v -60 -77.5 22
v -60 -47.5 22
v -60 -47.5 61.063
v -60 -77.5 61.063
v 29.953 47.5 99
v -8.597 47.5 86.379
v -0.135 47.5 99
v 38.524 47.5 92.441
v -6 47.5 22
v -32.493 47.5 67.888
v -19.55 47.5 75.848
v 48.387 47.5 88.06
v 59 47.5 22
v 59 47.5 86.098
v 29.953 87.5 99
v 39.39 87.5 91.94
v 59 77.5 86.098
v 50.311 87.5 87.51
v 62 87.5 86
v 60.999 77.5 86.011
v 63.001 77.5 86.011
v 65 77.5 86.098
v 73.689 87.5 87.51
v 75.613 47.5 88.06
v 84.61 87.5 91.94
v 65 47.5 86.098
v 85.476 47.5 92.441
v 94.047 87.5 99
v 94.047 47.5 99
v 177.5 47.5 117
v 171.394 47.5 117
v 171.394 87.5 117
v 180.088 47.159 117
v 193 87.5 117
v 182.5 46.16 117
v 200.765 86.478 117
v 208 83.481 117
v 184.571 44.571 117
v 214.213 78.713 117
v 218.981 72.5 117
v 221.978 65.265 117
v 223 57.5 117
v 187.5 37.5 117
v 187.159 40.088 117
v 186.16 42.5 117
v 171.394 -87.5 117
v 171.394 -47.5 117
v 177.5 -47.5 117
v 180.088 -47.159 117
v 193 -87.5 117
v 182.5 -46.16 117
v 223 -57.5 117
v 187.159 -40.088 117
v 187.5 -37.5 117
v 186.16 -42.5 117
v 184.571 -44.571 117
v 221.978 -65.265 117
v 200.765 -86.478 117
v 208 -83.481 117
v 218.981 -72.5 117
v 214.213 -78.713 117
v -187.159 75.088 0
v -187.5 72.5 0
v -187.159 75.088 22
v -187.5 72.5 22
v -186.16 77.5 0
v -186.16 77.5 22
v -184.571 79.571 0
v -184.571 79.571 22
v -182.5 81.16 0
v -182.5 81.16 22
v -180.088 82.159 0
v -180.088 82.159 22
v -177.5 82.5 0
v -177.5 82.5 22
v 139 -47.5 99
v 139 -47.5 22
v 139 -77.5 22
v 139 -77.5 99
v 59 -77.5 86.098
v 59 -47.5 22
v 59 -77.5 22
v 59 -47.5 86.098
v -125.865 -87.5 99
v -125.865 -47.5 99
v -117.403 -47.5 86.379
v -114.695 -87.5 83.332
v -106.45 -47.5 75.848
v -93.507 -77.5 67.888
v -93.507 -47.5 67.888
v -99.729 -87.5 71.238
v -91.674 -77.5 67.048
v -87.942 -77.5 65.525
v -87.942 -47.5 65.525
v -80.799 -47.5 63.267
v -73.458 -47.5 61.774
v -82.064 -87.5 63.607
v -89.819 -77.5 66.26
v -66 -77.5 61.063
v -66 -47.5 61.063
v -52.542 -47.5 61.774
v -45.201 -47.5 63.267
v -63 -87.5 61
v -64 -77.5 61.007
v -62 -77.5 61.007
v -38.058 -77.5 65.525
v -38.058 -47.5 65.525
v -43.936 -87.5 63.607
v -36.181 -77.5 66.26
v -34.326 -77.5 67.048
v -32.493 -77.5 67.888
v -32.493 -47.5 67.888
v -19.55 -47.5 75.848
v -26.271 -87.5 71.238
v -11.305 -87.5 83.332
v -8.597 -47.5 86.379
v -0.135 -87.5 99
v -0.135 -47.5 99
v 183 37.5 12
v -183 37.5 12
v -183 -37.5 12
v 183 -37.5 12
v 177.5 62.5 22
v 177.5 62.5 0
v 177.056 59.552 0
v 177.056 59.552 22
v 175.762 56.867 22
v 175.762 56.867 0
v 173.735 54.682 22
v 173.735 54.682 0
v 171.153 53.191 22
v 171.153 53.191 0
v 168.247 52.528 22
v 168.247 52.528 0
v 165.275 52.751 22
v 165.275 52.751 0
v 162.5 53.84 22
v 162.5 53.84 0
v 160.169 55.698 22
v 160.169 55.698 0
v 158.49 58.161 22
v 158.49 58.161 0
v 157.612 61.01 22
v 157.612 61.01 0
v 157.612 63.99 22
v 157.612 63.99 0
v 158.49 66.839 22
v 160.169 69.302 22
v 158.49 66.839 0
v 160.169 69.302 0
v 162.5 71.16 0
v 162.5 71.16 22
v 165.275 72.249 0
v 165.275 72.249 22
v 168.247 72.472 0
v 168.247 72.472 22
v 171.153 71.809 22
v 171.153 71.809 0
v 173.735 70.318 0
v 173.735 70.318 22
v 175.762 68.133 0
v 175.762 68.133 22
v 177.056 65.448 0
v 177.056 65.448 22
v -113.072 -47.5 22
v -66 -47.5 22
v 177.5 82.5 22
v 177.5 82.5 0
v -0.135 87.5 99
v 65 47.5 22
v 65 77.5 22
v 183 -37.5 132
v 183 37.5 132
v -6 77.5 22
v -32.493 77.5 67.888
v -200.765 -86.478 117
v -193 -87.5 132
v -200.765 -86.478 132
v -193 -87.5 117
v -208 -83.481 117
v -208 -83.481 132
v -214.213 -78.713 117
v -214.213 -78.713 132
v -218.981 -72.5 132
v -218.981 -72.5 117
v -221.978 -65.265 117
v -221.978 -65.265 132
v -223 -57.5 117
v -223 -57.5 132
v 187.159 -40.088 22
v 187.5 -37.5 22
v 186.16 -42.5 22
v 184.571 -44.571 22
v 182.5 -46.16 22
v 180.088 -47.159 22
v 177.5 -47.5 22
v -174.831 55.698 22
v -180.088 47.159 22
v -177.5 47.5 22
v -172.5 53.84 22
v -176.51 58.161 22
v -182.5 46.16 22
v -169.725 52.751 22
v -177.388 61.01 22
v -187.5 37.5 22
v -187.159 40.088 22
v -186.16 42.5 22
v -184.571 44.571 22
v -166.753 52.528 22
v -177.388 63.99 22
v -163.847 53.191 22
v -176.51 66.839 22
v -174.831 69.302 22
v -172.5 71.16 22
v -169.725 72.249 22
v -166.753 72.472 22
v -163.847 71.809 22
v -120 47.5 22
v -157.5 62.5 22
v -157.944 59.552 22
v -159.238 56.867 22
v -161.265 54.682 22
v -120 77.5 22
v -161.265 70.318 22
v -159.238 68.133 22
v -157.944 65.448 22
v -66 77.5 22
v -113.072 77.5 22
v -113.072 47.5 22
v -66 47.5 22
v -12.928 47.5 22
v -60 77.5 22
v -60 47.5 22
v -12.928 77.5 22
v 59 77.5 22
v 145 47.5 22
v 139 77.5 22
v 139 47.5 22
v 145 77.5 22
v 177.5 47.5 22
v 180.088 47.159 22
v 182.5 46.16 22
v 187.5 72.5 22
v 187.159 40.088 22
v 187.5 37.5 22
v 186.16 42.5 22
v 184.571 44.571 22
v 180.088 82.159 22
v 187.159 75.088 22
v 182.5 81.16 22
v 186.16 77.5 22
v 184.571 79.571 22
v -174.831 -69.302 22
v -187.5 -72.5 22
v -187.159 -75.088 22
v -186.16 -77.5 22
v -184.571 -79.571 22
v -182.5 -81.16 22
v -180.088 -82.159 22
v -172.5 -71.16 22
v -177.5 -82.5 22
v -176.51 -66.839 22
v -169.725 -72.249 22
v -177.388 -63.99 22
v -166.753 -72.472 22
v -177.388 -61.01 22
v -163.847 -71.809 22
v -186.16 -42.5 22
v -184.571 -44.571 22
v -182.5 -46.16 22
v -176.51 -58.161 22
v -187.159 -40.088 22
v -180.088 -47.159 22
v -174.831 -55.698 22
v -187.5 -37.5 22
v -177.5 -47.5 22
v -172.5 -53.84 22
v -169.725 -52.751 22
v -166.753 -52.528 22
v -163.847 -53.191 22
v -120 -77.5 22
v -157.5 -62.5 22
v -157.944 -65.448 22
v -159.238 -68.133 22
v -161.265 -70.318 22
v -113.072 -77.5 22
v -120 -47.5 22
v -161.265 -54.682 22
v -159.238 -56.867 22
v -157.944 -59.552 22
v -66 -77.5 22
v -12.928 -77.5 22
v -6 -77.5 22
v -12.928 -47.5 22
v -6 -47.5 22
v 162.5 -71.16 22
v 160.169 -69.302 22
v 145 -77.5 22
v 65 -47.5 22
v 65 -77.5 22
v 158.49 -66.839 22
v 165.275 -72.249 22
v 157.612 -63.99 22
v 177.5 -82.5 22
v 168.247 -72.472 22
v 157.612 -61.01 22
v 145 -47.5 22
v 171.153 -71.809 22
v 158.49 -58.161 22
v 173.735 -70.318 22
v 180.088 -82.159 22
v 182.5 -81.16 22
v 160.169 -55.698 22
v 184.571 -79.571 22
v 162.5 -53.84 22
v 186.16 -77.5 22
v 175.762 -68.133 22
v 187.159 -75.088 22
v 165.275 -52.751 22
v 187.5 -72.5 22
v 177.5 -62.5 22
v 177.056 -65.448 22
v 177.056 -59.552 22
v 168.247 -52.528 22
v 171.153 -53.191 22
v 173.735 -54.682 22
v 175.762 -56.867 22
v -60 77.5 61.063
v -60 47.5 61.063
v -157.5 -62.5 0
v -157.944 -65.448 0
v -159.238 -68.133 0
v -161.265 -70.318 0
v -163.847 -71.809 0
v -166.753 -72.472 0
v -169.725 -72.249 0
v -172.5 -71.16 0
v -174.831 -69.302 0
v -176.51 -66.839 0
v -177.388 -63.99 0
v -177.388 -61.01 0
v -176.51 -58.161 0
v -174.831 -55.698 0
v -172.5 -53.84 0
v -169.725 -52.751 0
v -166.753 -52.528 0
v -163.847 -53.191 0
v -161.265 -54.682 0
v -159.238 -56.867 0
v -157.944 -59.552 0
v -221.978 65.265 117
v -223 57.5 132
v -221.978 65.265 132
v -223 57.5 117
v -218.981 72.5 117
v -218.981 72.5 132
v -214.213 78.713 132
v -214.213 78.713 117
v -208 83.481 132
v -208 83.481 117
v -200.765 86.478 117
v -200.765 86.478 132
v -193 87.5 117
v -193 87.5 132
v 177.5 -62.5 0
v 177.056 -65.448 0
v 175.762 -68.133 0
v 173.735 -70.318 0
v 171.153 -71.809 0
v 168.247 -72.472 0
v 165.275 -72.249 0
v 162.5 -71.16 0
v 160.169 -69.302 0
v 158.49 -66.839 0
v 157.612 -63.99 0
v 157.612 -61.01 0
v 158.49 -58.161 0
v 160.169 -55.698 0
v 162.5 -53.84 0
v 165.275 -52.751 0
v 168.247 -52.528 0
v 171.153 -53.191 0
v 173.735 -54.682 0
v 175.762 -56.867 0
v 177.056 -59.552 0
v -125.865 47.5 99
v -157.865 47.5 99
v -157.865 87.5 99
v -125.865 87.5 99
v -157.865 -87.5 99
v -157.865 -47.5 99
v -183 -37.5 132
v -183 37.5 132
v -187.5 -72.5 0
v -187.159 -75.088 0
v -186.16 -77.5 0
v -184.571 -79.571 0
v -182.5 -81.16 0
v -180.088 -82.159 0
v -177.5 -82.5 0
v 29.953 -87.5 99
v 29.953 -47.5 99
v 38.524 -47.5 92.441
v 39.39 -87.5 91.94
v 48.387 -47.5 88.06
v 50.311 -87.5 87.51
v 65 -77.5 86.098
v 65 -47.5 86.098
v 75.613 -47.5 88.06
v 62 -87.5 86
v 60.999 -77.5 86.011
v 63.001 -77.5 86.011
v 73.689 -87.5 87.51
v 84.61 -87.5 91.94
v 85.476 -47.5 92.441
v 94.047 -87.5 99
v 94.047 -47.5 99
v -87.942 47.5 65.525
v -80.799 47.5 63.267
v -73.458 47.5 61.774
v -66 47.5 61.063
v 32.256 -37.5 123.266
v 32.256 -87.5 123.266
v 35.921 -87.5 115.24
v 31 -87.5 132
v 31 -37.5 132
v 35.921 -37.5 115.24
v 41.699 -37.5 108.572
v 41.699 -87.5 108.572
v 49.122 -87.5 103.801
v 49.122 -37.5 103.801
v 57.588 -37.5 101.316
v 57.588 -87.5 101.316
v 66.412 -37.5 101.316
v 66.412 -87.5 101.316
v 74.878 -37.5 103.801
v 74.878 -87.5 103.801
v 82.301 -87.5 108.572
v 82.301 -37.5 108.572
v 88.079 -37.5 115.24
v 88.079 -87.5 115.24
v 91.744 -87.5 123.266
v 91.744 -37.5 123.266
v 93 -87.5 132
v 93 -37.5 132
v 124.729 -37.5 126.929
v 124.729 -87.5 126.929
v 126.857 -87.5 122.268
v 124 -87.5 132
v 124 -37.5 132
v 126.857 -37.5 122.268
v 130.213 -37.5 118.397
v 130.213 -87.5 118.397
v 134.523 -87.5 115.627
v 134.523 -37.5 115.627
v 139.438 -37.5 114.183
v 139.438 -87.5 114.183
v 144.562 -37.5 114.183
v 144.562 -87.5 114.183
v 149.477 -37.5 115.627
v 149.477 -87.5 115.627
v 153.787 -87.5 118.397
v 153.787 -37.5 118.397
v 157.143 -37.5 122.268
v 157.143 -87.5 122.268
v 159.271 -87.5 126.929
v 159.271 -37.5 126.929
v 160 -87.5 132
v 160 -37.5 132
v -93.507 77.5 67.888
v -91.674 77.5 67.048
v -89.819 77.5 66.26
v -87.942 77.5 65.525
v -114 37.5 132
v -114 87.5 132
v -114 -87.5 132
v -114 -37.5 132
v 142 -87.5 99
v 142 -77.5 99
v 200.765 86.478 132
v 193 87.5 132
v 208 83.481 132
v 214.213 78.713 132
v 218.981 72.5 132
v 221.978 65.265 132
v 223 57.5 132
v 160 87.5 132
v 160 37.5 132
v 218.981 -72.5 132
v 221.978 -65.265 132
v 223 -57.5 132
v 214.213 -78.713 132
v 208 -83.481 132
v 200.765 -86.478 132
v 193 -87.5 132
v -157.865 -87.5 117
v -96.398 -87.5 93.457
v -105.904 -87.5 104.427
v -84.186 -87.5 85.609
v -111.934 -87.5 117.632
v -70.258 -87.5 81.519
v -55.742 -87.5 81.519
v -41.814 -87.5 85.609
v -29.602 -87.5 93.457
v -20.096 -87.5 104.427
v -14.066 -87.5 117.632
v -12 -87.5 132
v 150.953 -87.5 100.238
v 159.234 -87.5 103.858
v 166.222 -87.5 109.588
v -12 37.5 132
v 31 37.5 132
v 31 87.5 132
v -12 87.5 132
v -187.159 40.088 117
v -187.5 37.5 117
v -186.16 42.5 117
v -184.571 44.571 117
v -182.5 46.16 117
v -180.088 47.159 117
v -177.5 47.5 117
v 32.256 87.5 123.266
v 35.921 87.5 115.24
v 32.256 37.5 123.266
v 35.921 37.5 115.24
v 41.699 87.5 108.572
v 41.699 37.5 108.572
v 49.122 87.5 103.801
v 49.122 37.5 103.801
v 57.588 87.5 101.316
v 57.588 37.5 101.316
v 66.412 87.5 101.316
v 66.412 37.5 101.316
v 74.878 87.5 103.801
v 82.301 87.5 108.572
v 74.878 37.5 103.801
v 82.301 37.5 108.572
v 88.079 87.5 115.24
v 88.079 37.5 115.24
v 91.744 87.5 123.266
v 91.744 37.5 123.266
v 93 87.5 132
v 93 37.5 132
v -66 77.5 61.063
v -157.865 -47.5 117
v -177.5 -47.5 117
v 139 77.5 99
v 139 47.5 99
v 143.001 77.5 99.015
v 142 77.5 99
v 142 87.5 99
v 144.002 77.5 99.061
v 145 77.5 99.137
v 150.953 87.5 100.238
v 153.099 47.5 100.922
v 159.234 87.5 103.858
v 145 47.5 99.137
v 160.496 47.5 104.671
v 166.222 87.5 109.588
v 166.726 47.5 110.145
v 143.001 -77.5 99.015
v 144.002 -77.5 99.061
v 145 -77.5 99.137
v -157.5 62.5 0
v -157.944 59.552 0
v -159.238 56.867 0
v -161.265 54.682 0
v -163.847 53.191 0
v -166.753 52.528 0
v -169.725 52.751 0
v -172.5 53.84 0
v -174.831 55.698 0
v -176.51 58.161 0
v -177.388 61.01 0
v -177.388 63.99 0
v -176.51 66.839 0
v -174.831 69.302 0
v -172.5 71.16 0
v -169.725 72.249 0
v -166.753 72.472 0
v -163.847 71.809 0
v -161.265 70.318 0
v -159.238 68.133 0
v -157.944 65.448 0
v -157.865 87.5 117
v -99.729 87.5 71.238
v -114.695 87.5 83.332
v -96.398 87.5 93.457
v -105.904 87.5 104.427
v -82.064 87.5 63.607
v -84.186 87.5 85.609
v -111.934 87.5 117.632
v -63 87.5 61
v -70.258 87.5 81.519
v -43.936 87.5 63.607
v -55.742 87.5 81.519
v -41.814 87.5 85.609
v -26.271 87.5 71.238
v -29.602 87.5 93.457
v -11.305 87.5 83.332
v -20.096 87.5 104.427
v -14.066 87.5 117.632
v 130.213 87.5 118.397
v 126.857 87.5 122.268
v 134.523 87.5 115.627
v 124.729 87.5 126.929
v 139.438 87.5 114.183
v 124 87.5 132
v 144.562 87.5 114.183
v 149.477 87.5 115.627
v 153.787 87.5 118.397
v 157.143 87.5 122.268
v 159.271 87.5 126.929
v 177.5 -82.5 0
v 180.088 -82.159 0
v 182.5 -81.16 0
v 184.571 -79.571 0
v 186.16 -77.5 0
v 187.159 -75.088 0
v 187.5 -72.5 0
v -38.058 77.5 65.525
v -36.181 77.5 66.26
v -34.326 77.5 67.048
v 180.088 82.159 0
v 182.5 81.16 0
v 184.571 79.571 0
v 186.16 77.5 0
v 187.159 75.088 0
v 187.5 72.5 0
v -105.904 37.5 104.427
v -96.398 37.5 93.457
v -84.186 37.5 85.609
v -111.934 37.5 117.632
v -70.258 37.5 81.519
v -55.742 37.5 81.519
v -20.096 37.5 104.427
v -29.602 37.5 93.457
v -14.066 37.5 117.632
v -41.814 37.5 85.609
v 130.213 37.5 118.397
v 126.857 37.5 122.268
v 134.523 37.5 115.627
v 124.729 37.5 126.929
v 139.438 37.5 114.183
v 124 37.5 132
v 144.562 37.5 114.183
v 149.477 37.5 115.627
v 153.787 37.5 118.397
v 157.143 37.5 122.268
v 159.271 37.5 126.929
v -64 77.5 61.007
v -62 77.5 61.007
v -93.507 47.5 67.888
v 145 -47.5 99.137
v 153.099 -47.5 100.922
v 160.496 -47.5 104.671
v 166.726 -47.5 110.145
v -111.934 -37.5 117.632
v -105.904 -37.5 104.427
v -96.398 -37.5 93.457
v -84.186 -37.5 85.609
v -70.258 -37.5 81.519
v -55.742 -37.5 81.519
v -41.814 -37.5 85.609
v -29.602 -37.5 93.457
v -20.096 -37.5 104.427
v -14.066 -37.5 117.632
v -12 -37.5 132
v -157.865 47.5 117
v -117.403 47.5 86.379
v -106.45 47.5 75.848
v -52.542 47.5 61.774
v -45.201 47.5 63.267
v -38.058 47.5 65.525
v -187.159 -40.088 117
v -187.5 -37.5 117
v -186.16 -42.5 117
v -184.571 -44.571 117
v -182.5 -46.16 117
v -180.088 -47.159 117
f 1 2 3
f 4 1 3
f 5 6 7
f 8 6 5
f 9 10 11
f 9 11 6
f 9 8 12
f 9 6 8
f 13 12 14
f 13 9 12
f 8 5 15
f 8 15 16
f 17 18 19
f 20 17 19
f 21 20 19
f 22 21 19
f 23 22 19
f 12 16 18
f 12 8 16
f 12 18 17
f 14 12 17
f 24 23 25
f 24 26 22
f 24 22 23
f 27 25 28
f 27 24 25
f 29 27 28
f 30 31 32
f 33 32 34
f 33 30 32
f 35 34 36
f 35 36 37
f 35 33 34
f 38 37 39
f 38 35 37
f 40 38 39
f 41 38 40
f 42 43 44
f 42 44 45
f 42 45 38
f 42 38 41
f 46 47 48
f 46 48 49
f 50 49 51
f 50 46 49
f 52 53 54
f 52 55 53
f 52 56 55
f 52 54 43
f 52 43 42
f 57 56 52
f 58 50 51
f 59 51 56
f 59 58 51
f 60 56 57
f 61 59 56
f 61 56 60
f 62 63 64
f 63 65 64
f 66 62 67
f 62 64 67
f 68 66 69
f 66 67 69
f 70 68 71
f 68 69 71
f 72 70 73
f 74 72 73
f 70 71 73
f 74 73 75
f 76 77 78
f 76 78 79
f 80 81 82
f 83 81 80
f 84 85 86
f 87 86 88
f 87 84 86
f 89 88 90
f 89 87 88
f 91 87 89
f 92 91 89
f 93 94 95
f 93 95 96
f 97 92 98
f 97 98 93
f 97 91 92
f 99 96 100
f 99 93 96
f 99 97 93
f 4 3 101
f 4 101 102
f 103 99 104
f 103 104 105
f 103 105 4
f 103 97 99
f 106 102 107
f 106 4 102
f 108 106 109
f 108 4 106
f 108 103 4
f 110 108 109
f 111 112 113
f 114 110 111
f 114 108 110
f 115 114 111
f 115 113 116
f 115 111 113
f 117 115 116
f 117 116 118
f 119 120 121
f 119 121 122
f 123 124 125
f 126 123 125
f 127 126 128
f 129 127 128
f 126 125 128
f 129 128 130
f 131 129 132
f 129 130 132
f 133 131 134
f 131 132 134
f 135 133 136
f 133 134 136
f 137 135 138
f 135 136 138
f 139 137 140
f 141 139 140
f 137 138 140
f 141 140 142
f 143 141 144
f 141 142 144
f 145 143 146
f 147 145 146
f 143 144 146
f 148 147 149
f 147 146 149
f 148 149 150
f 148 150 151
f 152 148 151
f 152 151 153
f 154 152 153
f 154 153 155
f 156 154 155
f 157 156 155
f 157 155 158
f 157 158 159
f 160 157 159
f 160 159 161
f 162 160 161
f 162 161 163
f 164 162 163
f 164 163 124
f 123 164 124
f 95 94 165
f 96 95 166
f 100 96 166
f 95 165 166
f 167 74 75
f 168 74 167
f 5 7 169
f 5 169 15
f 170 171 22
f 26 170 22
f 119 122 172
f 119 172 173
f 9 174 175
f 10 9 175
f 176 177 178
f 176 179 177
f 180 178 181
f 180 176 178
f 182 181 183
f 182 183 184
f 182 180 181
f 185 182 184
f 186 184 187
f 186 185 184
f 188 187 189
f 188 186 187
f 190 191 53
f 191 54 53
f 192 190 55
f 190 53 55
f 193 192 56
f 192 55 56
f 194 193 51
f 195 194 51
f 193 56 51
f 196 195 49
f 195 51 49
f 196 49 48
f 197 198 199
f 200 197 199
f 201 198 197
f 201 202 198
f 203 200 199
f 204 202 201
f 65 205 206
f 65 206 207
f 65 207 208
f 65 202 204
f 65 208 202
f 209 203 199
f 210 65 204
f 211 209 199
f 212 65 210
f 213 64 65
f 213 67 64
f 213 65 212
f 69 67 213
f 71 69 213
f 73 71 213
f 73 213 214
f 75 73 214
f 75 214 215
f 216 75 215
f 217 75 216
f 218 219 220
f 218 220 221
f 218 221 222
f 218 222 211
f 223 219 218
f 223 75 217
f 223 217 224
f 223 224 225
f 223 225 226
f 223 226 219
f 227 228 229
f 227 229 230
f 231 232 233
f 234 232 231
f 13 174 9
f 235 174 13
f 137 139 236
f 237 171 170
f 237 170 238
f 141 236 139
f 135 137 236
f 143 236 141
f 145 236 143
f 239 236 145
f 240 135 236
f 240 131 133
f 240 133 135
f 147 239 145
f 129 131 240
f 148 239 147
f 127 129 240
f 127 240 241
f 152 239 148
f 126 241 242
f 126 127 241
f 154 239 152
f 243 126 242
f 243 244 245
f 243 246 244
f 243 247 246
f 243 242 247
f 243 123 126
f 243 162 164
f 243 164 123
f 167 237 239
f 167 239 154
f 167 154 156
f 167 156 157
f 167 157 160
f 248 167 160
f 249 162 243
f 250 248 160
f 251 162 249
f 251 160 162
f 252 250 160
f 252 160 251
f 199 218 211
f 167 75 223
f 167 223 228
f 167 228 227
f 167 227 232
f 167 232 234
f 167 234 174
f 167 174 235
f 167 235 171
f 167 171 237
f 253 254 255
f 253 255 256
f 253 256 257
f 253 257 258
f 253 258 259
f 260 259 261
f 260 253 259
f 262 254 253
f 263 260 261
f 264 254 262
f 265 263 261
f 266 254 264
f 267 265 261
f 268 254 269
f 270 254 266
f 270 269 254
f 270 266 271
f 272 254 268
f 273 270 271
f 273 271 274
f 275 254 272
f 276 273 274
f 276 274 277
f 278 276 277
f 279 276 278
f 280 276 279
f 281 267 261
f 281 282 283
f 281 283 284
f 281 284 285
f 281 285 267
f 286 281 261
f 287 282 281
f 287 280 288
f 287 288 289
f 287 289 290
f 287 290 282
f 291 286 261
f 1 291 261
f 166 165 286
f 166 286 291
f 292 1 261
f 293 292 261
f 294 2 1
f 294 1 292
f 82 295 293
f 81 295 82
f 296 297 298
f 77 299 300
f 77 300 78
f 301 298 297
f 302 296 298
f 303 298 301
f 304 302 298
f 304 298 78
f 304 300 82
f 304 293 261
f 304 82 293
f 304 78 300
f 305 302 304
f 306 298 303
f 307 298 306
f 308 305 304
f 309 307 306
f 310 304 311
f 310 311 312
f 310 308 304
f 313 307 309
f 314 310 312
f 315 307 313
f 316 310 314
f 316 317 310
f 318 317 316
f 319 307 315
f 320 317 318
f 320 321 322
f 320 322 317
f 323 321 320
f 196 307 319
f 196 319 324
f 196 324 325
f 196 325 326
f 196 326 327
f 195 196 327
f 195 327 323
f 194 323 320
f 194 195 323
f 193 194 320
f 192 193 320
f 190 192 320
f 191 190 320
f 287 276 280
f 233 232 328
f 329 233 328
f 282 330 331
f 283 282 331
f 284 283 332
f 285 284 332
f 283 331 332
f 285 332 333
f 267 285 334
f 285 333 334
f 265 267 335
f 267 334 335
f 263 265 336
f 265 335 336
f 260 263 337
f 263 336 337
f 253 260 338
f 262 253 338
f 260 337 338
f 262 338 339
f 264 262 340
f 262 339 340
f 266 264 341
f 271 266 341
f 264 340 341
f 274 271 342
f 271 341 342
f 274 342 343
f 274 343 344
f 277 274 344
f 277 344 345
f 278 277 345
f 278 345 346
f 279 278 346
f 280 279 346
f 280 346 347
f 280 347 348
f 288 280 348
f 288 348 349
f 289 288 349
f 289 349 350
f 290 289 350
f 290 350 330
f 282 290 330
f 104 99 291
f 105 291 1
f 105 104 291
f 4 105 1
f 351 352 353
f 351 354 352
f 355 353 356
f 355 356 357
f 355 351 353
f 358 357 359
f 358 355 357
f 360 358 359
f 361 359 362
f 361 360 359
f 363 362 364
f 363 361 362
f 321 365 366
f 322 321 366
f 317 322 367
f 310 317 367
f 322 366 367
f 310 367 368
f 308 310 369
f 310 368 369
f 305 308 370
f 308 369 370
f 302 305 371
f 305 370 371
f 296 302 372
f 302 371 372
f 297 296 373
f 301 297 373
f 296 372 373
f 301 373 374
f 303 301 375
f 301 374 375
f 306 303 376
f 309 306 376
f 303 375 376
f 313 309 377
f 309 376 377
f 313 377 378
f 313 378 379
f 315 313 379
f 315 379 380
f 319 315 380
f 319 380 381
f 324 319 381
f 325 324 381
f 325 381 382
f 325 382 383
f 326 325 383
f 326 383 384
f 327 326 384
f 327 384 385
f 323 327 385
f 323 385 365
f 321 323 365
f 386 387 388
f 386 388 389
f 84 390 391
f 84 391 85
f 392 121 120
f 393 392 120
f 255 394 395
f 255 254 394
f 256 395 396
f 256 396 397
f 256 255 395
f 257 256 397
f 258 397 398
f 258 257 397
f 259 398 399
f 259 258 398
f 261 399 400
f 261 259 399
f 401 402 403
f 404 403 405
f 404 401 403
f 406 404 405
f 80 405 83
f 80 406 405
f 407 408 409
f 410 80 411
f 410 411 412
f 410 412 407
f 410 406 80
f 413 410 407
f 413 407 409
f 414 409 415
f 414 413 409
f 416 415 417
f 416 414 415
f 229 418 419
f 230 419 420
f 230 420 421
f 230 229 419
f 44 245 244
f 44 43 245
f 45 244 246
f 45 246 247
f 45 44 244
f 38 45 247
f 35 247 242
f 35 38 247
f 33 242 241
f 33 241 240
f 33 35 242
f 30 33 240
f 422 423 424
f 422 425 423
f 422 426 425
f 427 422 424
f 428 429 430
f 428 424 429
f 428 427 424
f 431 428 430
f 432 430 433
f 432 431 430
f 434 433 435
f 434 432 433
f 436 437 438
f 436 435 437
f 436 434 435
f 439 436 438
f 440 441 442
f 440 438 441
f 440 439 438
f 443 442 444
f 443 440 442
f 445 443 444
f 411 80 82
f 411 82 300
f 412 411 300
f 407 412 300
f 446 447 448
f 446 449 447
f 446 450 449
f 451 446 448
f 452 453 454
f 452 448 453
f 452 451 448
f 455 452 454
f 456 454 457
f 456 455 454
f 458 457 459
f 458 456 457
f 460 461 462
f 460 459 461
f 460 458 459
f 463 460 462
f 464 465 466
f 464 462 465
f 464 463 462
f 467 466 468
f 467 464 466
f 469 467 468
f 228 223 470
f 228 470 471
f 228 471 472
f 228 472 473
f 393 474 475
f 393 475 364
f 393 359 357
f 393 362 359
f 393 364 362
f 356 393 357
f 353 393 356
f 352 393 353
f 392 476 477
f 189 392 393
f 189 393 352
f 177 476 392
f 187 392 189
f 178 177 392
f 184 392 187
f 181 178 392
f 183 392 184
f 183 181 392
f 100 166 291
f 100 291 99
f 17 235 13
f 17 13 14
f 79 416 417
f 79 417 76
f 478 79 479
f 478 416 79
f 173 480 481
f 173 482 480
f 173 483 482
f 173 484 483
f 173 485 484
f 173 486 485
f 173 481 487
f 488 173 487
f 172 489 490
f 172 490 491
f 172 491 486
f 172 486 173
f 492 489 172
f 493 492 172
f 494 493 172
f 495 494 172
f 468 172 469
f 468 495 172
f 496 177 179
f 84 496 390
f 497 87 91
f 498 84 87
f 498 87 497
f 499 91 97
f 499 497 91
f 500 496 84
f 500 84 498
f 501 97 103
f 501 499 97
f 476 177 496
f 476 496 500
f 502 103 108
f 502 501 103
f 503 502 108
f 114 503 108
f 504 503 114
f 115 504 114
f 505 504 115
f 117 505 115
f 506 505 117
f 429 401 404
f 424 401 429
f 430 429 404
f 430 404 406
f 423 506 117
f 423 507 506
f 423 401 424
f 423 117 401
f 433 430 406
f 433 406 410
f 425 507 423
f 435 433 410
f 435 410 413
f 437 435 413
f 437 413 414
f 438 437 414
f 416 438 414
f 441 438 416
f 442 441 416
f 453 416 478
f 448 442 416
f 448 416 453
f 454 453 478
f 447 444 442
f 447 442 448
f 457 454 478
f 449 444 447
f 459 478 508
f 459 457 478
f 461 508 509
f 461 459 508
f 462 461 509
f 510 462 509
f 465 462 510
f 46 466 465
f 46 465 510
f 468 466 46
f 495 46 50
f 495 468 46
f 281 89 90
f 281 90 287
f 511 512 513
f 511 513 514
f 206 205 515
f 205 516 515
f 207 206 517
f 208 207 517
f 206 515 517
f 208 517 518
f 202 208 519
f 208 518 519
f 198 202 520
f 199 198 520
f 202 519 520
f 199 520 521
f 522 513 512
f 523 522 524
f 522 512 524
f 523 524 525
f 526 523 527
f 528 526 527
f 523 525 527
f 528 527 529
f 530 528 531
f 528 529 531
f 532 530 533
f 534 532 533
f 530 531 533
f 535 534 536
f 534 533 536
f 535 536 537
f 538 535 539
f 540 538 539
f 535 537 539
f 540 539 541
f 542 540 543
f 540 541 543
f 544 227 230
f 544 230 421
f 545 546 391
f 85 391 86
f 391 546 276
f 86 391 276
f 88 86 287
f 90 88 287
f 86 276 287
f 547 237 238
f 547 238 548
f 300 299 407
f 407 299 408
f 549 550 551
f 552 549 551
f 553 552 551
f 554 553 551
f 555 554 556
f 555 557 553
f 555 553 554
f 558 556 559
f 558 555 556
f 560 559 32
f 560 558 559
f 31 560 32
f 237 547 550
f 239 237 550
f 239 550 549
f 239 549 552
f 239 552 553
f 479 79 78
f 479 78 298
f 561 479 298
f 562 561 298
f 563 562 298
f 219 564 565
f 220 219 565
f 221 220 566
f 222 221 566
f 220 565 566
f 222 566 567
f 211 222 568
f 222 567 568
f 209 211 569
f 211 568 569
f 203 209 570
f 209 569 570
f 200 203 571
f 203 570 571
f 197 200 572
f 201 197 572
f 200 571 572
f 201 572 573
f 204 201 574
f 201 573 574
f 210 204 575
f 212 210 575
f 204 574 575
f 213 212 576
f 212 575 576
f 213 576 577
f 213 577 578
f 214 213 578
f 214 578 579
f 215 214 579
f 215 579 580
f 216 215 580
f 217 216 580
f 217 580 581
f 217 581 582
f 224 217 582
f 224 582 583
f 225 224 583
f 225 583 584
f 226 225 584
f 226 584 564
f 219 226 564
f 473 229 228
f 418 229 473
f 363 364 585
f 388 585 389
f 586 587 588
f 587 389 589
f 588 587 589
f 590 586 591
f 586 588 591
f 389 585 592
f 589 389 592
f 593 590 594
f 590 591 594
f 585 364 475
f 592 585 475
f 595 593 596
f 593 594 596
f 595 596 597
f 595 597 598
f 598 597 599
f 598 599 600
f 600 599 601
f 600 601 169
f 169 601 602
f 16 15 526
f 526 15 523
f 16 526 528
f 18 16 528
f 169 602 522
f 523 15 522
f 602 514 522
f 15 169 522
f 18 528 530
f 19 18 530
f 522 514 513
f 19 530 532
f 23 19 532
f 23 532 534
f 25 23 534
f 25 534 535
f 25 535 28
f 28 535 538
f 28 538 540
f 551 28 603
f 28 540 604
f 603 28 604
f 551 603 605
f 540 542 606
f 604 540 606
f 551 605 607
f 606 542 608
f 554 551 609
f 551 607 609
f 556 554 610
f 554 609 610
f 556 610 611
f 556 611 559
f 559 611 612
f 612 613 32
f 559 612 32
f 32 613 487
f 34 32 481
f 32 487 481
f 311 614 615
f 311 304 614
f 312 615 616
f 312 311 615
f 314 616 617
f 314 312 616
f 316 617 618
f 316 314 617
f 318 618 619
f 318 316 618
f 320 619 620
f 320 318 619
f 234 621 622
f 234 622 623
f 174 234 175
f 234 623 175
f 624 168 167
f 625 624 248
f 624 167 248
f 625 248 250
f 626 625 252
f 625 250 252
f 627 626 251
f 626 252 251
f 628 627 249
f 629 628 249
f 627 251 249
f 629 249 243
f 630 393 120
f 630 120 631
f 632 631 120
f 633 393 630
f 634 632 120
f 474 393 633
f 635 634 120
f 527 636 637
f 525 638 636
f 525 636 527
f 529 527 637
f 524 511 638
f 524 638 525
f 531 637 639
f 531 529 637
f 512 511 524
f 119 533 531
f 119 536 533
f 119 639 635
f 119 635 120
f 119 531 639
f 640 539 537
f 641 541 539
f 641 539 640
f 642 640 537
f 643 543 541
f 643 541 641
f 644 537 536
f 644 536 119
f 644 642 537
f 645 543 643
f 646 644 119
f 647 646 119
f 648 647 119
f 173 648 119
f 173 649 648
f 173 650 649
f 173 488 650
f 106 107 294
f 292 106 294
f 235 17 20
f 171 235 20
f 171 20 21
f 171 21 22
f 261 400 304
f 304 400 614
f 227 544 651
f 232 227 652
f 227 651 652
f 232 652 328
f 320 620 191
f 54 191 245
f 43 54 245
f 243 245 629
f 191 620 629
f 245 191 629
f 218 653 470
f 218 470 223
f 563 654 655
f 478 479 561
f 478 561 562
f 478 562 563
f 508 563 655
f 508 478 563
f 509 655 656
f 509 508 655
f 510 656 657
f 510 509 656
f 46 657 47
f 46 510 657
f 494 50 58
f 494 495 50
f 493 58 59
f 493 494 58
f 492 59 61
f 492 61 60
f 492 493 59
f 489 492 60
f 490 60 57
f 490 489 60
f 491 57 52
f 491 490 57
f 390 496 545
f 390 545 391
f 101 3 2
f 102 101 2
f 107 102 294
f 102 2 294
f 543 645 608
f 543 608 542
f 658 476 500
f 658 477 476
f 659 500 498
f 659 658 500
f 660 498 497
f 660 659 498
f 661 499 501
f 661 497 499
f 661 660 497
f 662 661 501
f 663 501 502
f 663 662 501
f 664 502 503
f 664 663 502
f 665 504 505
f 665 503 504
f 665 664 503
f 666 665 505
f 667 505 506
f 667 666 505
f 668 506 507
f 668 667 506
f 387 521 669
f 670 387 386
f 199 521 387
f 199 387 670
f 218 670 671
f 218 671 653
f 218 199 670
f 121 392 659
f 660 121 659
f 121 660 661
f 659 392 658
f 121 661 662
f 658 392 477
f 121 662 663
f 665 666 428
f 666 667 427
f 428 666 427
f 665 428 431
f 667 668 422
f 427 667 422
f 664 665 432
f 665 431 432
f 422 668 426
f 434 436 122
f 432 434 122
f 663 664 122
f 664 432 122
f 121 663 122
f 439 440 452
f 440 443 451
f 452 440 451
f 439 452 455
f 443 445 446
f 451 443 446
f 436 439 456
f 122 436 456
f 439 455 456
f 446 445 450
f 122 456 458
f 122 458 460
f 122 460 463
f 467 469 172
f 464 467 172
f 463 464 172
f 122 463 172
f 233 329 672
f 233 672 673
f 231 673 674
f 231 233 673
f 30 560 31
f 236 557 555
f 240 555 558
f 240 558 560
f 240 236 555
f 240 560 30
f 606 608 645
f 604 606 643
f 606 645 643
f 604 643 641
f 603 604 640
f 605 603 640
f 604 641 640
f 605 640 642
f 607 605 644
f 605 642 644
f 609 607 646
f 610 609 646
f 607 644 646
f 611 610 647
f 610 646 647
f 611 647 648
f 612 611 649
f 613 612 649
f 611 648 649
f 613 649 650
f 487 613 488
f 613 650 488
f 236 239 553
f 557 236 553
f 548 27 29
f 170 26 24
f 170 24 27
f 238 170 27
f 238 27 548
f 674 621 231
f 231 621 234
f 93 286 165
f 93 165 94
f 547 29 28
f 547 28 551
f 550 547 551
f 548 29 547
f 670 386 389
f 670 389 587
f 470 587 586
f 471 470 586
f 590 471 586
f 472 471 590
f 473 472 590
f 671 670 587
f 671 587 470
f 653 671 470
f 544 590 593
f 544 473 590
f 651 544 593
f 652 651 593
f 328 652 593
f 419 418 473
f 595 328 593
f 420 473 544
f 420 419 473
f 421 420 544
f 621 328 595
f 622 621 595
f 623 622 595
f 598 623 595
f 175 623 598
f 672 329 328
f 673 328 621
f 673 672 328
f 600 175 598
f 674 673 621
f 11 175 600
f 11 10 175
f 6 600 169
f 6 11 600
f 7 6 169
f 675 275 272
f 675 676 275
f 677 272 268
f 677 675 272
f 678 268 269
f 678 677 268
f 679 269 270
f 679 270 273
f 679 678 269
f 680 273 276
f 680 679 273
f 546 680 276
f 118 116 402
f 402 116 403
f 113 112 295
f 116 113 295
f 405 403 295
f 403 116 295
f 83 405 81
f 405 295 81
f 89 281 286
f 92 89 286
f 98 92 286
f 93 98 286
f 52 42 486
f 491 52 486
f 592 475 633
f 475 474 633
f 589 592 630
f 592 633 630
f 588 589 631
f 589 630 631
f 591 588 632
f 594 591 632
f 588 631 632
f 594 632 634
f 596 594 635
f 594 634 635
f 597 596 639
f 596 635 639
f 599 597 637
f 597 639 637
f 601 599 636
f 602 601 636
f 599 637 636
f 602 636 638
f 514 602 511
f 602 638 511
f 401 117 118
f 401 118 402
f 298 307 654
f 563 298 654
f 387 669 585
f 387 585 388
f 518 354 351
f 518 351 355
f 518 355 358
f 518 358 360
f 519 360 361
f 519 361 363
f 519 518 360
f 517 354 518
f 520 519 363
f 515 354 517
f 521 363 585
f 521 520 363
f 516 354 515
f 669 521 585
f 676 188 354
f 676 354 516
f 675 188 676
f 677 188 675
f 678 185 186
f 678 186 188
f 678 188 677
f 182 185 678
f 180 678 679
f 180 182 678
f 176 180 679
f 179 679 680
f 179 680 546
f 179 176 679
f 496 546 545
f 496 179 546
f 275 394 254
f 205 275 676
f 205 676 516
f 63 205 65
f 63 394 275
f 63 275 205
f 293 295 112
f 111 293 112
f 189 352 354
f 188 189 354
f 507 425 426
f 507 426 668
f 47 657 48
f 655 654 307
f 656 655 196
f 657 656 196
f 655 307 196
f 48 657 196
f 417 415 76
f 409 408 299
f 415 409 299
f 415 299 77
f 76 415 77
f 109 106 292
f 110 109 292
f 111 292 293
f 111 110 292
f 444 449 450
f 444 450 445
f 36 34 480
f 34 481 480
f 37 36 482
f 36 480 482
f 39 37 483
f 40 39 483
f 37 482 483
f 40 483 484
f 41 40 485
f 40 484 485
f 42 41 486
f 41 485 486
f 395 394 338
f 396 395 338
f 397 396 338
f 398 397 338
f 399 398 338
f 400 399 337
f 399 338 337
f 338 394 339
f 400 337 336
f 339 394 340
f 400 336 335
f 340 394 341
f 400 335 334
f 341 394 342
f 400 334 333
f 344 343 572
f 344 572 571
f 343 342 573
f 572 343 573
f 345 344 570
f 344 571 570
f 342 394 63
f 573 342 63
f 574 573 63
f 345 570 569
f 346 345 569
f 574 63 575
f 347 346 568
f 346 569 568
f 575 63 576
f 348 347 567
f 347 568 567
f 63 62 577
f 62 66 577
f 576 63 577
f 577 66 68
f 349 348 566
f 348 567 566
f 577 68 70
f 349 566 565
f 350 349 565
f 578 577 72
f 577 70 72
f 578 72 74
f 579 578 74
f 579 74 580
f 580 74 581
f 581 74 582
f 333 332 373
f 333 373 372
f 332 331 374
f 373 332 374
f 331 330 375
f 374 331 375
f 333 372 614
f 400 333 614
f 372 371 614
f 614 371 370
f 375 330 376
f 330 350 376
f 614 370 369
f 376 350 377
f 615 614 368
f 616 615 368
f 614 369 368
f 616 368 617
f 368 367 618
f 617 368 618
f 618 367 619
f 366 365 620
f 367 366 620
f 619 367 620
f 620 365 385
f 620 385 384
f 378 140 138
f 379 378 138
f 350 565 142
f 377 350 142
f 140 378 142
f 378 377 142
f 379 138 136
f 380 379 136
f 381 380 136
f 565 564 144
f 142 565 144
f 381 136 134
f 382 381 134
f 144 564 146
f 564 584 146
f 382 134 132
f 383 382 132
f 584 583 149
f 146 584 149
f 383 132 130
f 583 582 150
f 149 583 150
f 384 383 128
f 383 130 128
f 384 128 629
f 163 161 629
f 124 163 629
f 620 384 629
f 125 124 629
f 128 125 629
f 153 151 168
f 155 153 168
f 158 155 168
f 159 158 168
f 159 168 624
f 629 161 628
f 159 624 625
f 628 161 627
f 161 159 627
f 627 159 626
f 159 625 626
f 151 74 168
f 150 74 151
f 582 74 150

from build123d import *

# Parameters (mm, degrees)
F0_W           = 375
F0_H           = 165
F1_DEPTH       = 22
F2_W           = 375
F2_H           = 95
F3_DEPTH       = 95
F4_R           = 10
F6_DEPTH       = 87.5
F7_W           = 6
F7_H           = 110
F8_DEPTH       = 77.5
F9_R           = 30
F10_R          = 51
F10_R_2        = 31
F10_R_3        = 18
F11_DEPTH      = 87.501
F11_DEPTH_BACK = 87.501
F12_W          = 366
F12_H          = 75
F13_DEPTH      = 120
F14_R          = 10
F15_DEPTH      = 25


with BuildPart() as f1:
    # F0 (on Top) → F1 (new body)
    with BuildSketch(Plane.XY):
        Rectangle(F0_W, F0_H)
    extrude(amount=F1_DEPTH)

    # F2 (on face) → F3 (join)
    with BuildSketch(Plane.XY.offset(22)):
        Rectangle(F2_W, F2_H)
    extrude(amount=F3_DEPTH)

    # F4
    f4_edges = [f1.edges().sort_by_distance(p)[0] for p in [
        (-187.5, -82.5, 11),
        (187.5, -82.5, 11),
        (187.5, 82.5, 11),
        (187.5, 47.5, 69.5),
        (187.5, -47.5, 69.5),
        (-187.5, -47.5, 69.5),
        (-187.5, 47.5, 69.5),
        (-187.5, 82.5, 11),
    ]]
    fillet(f4_edges, radius=F4_R)

    # F5 (on Front) → F6 (join, symmetric)
    with BuildSketch(Plane.XZ):
        with BuildLine():
            Line((223, 132), (-223, 132))
            Line((-223, 132), (-223, 117))
            Line((-223, 117), (-157.864934582, 117))
            Line((-157.864934582, 117), (-157.864934582, 99))
            Line((-157.864934582, 99), (-125.864934582, 99))
            ThreePointArc((-125.864934582, 99), (-63, 61), (-0.135065418, 99))
            Line((-0.135065418, 99), (29.9531592821, 99))
            ThreePointArc((29.9531592821, 99), (62, 86), (94.0468407179, 99))
            Line((94.0468407179, 99), (142, 99))
            ThreePointArc((142, 99), (159.2336879396, 103.8575054411), (171.3938769134, 117))
            Line((171.3938769134, 117), (223, 117))
            Line((223, 117), (223, 132))
        make_face()
    extrude(amount=F6_DEPTH, both=True)

    # F7 (on Front) → F8 (join, symmetric)
    with BuildSketch(Plane.XZ):
        with Locations((-63, 77)):
            Rectangle(F7_W, F7_H)
        with Locations((62, 77)):
            Rectangle(F7_W, F7_H)
        with Locations((142, 77)):
            Rectangle(F7_W, F7_H)
        Polygon((-44.7298753819, 77.0821119323), (-11.1961524227, 19), (-6, 22), (-39.5337229592, 80.0821119323), align=None)
        Polygon((-86.4662770408, 80.0821119323), (-120, 22), (-114.8038475773, 19), (-81.2701246181, 77.0821119323), align=None)
    extrude(amount=F8_DEPTH, both=True)

    # F9
    f9_edges = [f1.edges().sort_by_distance(p)[0] for p in [
        (223, -87.5, 124.5),
        (223, 87.5, 124.5),
        (-223, 87.5, 124.5),
        (-223, -87.5, 124.5),
    ]]
    fillet(f9_edges, radius=F9_R)

    # F10 (on Front) → F11 (cut, two sides)
    with BuildSketch(Plane.XZ) as f11_sk:
        with Locations((-63, 132)):
            Circle(F10_R)
        with Locations((62, 132)):
            Circle(F10_R_2)
        with Locations((142, 132)):
            Circle(F10_R_3)
    extrude(amount=-F11_DEPTH, mode=Mode.SUBTRACT)
    extrude(f11_sk.sketch, amount=F11_DEPTH_BACK, mode=Mode.SUBTRACT)

    # F12 (on face) → F13 (cut)
    with BuildSketch(Plane.XY.offset(132)):
        Rectangle(F12_W, F12_H)
    extrude(amount=-F13_DEPTH, mode=Mode.SUBTRACT)

    # F14 (on face) → F15 (cut)
    with BuildSketch(Plane(origin=(0, 0, 0), x_dir=(1, 0, 0), z_dir=(0, 0, -1))):
        with Locations((-167.5, 62.5)):
            Circle(F14_R)
        with Locations((-167.5, -62.5)):
            Circle(F14_R)
        with Locations((167.5, -62.5)):
            Circle(F14_R)
        with Locations((167.5, 62.5)):
            Circle(F14_R)
    extrude(amount=-F15_DEPTH, mode=Mode.SUBTRACT)


solid = f1.part
